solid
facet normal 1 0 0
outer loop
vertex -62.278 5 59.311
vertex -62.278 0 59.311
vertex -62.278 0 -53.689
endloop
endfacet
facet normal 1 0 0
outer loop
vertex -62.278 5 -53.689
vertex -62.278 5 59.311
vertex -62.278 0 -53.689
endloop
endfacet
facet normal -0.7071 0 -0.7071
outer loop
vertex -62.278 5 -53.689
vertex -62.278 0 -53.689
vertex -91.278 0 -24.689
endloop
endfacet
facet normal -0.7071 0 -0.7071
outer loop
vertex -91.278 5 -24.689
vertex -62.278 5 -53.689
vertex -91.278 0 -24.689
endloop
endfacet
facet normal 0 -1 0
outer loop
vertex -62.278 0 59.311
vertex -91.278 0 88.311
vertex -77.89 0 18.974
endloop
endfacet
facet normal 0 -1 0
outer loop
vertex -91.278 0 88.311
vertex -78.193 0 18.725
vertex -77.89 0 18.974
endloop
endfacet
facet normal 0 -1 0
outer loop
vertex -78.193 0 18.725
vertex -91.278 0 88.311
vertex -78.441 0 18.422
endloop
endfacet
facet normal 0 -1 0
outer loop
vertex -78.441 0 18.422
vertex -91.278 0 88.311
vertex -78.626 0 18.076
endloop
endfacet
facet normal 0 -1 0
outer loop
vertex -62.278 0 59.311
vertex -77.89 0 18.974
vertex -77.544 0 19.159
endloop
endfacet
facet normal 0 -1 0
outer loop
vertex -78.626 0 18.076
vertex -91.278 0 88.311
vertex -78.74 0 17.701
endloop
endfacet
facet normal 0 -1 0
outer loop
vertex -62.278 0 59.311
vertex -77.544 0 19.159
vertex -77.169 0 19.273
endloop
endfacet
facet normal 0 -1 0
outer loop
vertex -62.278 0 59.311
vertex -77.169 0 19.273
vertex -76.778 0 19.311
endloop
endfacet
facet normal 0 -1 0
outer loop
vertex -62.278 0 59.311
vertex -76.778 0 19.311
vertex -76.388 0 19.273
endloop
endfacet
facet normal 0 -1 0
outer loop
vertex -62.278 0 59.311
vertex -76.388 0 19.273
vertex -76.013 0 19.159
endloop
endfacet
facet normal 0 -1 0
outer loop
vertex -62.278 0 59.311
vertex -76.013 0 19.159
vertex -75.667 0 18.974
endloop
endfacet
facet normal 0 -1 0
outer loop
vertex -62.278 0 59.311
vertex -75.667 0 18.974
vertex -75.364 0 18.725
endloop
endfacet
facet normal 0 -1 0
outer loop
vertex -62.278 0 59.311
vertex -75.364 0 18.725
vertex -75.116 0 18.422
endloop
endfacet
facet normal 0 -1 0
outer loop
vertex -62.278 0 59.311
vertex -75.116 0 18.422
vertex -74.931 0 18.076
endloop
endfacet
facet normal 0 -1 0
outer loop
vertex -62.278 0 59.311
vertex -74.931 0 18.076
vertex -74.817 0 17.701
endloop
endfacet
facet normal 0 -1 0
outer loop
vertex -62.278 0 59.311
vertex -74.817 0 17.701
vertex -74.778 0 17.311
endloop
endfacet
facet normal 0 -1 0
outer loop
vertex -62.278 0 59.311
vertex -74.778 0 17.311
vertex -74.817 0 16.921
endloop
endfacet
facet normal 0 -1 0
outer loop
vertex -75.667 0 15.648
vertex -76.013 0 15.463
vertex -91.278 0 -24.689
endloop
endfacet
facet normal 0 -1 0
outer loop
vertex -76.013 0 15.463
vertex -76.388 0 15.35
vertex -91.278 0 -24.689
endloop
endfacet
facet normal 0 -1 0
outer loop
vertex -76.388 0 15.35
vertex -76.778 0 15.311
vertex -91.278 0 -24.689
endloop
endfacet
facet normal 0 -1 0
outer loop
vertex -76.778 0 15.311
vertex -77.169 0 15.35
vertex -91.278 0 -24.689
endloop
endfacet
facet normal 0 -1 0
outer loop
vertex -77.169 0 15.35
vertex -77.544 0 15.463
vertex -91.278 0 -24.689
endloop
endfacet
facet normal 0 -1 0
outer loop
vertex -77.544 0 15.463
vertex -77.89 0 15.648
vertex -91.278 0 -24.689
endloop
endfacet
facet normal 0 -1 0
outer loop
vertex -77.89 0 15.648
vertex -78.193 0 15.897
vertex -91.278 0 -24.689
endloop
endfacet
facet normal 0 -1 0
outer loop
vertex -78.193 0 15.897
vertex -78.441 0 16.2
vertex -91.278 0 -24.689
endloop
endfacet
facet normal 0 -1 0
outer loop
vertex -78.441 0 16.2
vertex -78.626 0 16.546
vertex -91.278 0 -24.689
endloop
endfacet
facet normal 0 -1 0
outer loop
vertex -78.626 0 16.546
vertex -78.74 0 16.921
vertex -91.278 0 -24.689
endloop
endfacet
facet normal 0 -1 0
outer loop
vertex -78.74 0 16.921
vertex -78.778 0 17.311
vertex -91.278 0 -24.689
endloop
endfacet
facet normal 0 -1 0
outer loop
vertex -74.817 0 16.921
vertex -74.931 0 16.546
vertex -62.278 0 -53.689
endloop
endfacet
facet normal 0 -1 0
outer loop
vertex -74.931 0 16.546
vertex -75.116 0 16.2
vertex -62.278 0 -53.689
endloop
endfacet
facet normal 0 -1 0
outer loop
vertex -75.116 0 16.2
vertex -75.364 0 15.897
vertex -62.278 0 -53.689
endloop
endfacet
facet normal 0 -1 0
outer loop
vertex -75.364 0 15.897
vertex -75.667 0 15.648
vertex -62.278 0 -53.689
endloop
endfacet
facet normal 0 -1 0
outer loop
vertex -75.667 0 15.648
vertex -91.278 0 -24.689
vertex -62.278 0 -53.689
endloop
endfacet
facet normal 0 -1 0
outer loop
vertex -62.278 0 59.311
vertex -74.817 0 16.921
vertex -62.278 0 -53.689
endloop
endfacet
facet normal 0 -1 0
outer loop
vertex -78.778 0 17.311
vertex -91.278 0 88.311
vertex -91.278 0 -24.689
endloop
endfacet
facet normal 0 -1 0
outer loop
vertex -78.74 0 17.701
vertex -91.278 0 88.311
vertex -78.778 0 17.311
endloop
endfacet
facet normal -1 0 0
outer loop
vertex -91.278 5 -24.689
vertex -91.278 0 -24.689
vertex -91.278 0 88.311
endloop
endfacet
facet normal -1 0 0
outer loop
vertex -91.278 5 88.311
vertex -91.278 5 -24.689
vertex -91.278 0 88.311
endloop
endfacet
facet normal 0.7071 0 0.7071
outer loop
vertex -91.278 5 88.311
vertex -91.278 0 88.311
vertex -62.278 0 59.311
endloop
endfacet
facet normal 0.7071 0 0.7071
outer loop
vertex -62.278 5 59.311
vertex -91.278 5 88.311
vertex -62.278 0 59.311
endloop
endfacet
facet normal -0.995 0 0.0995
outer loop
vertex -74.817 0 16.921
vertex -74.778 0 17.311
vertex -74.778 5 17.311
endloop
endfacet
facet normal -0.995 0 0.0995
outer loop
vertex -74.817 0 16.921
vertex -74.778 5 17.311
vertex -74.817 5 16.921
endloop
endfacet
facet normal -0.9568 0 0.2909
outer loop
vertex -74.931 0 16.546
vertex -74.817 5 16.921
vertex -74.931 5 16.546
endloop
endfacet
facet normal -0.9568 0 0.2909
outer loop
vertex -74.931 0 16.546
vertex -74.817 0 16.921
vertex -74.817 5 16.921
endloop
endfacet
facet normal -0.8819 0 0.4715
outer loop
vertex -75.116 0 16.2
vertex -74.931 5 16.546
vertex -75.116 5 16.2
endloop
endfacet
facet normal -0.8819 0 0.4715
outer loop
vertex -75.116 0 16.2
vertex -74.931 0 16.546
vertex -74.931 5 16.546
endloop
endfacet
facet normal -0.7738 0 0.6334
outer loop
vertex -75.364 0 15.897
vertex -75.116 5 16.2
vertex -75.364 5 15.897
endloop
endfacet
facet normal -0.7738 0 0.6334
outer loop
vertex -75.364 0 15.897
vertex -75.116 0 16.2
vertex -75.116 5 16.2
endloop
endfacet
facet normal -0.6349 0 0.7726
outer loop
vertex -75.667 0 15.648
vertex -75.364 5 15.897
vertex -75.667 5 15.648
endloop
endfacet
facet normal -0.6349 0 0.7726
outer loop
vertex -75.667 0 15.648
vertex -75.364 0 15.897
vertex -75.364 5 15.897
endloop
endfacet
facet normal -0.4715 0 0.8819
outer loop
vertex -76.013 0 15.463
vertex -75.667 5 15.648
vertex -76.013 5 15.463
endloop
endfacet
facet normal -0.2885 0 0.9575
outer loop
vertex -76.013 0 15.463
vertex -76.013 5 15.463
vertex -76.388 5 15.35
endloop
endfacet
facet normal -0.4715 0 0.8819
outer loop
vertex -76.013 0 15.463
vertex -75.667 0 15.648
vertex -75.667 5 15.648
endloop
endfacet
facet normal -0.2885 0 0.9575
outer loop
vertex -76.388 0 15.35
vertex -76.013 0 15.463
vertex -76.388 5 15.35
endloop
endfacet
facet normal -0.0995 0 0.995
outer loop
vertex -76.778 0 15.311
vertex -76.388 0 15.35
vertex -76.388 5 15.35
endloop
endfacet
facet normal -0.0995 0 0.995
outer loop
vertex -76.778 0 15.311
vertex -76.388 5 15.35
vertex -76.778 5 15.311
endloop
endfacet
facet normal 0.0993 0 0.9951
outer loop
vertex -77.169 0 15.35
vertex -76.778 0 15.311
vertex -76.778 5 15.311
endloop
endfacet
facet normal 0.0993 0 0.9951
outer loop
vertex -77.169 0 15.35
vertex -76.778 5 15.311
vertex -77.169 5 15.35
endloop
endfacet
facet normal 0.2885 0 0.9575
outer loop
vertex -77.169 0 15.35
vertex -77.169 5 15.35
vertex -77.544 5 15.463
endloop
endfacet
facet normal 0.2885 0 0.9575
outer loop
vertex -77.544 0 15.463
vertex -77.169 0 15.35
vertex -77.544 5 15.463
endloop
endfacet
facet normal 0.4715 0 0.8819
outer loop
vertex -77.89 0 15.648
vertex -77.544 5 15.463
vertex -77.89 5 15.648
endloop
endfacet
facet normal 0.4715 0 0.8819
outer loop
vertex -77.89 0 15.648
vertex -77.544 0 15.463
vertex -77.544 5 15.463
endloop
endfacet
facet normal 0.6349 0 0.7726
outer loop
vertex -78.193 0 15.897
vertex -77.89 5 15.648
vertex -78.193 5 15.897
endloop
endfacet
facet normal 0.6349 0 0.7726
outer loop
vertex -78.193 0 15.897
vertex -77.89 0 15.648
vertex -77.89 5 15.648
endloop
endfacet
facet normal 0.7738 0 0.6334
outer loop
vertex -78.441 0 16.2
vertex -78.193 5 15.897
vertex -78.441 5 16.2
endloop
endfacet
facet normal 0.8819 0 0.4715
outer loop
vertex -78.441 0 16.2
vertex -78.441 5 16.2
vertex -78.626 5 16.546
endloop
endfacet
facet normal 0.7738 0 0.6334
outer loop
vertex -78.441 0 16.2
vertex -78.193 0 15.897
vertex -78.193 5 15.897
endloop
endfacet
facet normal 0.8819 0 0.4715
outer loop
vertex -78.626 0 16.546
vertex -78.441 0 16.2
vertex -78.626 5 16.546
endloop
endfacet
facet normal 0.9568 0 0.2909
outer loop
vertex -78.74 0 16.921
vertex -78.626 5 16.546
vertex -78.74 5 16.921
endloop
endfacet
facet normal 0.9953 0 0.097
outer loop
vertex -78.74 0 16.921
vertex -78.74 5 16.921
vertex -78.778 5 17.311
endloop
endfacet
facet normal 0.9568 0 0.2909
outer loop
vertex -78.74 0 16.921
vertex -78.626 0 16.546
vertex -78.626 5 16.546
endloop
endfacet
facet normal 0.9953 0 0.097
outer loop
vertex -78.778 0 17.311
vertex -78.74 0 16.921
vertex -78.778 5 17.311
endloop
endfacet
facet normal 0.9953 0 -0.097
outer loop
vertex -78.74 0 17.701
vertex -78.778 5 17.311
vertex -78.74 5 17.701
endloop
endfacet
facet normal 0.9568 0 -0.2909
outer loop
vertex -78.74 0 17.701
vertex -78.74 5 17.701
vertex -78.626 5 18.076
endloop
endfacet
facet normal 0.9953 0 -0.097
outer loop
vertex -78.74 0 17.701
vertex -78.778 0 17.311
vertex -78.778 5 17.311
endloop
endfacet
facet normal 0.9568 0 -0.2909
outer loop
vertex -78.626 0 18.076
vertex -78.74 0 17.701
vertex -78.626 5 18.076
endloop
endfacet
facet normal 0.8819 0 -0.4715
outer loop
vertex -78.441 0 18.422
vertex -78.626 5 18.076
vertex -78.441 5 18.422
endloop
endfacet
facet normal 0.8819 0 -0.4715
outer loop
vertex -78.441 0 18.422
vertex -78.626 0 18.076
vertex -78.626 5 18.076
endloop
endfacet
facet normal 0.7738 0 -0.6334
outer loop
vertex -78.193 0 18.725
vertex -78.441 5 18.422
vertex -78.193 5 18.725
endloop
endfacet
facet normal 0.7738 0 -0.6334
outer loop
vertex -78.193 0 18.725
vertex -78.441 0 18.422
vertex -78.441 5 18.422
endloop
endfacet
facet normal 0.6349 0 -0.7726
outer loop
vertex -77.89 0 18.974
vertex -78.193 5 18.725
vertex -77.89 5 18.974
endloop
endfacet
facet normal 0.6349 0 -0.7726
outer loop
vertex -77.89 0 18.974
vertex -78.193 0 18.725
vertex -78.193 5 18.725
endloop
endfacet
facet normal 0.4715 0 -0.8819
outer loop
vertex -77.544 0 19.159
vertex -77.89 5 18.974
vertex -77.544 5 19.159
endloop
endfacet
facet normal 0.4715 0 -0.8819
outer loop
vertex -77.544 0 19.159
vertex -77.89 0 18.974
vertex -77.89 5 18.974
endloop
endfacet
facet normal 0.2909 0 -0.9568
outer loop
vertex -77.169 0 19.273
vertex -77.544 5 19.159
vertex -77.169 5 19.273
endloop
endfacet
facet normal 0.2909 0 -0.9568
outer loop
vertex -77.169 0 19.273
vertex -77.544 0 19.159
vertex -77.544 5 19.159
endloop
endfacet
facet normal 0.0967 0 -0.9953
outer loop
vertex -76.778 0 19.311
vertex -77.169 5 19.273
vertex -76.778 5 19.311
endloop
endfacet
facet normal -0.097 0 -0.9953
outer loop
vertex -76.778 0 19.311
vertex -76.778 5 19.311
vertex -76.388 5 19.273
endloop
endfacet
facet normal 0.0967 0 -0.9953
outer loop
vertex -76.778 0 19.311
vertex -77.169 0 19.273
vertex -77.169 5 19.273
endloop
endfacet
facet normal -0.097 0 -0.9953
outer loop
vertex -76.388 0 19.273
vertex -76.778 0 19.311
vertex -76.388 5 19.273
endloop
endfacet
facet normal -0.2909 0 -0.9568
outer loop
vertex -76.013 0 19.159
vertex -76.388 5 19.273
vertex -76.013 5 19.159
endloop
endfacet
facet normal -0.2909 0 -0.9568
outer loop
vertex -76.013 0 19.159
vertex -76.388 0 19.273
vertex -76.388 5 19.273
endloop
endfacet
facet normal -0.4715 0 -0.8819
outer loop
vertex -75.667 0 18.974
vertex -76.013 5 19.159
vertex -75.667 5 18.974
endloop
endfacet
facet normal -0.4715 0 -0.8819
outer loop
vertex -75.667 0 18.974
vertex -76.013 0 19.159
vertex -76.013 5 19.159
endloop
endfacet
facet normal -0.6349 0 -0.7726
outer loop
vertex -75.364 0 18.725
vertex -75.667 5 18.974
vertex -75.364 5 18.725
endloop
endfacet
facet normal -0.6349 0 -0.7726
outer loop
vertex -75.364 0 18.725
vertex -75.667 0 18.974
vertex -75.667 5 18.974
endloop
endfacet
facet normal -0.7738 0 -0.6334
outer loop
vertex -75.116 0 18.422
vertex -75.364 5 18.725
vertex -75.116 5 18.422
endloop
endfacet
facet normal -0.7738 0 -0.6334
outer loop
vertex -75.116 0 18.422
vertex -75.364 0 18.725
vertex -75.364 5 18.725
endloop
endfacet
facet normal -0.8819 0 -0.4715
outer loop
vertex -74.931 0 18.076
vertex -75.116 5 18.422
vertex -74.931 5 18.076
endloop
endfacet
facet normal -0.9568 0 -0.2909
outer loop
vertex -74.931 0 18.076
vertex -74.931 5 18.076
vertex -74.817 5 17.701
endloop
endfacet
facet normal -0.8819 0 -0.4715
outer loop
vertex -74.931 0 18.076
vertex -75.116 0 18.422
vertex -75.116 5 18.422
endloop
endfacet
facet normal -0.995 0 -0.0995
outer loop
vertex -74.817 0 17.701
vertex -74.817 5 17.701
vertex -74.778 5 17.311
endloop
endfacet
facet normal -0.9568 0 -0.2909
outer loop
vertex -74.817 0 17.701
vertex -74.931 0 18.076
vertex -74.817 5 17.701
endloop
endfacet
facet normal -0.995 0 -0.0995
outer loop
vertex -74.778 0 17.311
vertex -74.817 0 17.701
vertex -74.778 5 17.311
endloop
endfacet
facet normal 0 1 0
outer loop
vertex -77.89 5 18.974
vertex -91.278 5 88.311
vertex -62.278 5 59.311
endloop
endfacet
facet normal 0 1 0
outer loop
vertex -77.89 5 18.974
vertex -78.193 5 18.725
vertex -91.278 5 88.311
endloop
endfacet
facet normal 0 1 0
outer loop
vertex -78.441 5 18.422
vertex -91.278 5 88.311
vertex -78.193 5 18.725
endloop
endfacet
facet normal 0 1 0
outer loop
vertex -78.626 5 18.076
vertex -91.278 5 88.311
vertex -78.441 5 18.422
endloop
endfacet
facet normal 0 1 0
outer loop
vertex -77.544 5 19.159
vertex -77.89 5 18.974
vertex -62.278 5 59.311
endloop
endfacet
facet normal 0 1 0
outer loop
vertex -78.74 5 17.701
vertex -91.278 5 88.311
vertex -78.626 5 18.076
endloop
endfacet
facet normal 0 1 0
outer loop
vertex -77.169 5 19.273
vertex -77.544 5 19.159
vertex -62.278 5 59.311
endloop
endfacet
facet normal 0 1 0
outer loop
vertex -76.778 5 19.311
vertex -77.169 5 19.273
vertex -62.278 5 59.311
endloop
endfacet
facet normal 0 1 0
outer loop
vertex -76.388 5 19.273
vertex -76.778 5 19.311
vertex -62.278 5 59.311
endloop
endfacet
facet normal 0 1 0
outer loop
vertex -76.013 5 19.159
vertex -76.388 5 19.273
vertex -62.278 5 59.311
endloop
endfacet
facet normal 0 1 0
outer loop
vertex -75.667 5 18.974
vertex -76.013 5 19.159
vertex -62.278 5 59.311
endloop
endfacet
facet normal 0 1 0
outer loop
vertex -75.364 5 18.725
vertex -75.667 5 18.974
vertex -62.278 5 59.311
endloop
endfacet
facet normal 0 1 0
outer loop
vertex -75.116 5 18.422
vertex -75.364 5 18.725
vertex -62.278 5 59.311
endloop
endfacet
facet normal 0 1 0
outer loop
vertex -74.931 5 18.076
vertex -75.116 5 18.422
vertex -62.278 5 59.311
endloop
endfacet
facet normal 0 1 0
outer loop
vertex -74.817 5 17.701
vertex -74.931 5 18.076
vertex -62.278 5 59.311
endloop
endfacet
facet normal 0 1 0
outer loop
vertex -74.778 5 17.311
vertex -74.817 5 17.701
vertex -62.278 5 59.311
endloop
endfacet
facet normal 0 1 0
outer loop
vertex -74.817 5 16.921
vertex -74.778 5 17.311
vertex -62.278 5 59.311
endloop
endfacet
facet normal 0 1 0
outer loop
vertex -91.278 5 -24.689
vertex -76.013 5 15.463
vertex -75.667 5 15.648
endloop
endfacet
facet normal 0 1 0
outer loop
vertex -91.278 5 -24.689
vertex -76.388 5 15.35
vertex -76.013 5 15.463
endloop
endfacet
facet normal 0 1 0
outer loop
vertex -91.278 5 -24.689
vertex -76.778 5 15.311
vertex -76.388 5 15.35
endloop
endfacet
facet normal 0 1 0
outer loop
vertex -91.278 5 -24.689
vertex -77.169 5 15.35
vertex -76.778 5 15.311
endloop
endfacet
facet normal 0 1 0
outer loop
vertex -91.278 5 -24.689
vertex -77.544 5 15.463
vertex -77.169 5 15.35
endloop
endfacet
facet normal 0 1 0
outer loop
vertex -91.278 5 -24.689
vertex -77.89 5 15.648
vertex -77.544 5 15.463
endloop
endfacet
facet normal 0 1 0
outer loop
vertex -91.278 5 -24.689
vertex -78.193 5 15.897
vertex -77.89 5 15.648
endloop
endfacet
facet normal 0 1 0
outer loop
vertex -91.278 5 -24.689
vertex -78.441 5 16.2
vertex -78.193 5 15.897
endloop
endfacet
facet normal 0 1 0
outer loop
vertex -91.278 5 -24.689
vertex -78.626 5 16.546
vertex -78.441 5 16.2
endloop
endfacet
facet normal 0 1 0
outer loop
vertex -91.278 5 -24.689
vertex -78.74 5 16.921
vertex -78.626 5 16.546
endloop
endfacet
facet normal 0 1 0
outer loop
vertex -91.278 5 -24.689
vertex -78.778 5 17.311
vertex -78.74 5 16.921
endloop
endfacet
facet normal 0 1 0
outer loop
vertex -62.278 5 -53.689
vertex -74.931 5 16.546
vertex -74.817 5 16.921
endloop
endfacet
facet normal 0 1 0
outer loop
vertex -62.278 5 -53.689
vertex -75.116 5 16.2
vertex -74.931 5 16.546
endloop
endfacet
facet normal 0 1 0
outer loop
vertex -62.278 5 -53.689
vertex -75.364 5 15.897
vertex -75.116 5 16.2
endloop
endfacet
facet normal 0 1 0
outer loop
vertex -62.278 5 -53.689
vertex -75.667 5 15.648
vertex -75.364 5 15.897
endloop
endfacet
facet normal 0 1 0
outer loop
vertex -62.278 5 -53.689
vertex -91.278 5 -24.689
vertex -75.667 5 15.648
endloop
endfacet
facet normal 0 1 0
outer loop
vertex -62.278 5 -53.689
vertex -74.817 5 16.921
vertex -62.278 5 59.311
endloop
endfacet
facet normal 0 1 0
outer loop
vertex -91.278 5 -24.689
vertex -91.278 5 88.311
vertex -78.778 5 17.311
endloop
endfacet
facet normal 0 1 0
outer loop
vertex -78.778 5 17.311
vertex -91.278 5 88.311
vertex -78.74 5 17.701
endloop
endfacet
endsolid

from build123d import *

# Parameters (mm, degrees)
SKETCH1_R           = 2
BOSS_EXTRUDE1_DEPTH = 5


with BuildPart() as part:
    # Sketch1 → Boss-Extrude1 (new body)
    with BuildSketch(Plane(origin=(0, 0, 0), x_dir=(1, 0, 0), z_dir=(0, 1, 0))):
        Polygon((-62.278471827, 53.688877211), (-91.278471827, 24.688877211), (-91.278471827, -88.311122789), (-62.278471827, -59.311122789), align=None)
        with Locations((-76.778471827, -17.311122789)):
            Circle(SKETCH1_R, mode=Mode.SUBTRACT)
    extrude(amount=BOSS_EXTRUDE1_DEPTH)


solid = part.part
